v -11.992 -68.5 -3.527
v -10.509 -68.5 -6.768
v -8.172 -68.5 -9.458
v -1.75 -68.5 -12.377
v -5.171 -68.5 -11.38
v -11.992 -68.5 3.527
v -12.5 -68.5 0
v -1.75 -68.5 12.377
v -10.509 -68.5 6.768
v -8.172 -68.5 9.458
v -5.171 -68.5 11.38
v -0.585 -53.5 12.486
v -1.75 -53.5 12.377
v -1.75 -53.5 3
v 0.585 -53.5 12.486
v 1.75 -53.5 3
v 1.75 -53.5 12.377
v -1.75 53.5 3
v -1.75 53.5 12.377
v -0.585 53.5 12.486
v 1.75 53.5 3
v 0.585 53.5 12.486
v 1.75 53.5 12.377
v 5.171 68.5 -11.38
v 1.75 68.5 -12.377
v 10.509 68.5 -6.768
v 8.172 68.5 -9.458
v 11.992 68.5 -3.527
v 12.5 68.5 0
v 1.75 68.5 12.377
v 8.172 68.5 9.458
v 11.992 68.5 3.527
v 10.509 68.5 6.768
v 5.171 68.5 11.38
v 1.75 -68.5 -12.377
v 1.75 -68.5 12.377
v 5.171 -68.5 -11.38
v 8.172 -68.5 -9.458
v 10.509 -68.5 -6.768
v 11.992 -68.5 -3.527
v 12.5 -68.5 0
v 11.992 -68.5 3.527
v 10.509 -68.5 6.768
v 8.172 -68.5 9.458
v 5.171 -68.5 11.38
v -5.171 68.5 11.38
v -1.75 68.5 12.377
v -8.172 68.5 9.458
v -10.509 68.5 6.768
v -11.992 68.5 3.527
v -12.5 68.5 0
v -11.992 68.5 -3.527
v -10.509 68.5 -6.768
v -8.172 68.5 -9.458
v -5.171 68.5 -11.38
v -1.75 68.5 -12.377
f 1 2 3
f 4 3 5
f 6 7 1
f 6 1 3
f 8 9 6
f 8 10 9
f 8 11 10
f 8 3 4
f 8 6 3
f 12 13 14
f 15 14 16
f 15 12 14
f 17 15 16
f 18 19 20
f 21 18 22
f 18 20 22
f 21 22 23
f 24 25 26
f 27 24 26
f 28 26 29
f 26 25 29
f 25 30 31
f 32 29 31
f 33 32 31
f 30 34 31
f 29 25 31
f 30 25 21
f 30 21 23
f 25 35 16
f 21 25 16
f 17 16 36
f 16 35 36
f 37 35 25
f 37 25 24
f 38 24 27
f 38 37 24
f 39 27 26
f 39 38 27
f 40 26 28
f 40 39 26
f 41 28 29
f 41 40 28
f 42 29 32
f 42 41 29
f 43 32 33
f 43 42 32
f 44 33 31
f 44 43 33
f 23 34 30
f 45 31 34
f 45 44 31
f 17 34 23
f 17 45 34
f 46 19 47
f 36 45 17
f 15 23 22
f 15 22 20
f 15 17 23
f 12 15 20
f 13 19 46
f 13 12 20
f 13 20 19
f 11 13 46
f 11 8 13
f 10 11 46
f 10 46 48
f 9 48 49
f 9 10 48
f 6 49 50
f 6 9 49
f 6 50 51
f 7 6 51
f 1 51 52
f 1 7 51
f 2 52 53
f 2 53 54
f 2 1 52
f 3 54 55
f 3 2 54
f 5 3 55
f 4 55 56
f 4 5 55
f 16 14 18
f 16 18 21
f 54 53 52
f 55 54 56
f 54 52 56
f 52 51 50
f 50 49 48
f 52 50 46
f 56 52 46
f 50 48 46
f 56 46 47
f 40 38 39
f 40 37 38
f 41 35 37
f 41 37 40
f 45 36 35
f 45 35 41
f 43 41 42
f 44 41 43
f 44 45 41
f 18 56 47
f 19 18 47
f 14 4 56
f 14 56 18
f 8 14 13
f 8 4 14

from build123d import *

# Parameters (mm, degrees)
SKETCH_R          = 12.5
PAD_DEPTH         = 68.5
SKETCH001_W       = 3.5
SKETCH001_H       = 25
POCKET_DEPTH      = 68.501
POCKET_DEPTH_BACK = -68.501
SKETCH002_W       = 3.5
SKETCH002_H       = 30
POCKET001_DEPTH   = 15


with BuildPart() as part:
    # Sketch → Pad (new body, symmetric)
    with BuildSketch(Plane.XZ):
        Circle(SKETCH_R)
    extrude(amount=PAD_DEPTH, both=True)

    # Sketch001 → Pocket (cut, two sides)
    with BuildSketch(Plane.XZ) as pocket_sk:
        with Locations((0, -9.5)):
            Rectangle(SKETCH001_W, SKETCH001_H)
    extrude(amount=-POCKET_DEPTH, mode=Mode.SUBTRACT)
    extrude(pocket_sk.sketch, amount=-POCKET_DEPTH_BACK, mode=Mode.SUBTRACT)

    # Sketch002 → Pocket001 (cut)
    with BuildSketch(Plane.XZ.offset(68.5)):
        Rectangle(SKETCH002_W, SKETCH002_H)
    pocket001 = extrude(amount=-POCKET001_DEPTH, mode=Mode.SUBTRACT)

    # Mirrored: Pocket001 across XZ
    add(pocket001.mirror(Plane.XZ), mode=Mode.SUBTRACT)


solid = part.part
